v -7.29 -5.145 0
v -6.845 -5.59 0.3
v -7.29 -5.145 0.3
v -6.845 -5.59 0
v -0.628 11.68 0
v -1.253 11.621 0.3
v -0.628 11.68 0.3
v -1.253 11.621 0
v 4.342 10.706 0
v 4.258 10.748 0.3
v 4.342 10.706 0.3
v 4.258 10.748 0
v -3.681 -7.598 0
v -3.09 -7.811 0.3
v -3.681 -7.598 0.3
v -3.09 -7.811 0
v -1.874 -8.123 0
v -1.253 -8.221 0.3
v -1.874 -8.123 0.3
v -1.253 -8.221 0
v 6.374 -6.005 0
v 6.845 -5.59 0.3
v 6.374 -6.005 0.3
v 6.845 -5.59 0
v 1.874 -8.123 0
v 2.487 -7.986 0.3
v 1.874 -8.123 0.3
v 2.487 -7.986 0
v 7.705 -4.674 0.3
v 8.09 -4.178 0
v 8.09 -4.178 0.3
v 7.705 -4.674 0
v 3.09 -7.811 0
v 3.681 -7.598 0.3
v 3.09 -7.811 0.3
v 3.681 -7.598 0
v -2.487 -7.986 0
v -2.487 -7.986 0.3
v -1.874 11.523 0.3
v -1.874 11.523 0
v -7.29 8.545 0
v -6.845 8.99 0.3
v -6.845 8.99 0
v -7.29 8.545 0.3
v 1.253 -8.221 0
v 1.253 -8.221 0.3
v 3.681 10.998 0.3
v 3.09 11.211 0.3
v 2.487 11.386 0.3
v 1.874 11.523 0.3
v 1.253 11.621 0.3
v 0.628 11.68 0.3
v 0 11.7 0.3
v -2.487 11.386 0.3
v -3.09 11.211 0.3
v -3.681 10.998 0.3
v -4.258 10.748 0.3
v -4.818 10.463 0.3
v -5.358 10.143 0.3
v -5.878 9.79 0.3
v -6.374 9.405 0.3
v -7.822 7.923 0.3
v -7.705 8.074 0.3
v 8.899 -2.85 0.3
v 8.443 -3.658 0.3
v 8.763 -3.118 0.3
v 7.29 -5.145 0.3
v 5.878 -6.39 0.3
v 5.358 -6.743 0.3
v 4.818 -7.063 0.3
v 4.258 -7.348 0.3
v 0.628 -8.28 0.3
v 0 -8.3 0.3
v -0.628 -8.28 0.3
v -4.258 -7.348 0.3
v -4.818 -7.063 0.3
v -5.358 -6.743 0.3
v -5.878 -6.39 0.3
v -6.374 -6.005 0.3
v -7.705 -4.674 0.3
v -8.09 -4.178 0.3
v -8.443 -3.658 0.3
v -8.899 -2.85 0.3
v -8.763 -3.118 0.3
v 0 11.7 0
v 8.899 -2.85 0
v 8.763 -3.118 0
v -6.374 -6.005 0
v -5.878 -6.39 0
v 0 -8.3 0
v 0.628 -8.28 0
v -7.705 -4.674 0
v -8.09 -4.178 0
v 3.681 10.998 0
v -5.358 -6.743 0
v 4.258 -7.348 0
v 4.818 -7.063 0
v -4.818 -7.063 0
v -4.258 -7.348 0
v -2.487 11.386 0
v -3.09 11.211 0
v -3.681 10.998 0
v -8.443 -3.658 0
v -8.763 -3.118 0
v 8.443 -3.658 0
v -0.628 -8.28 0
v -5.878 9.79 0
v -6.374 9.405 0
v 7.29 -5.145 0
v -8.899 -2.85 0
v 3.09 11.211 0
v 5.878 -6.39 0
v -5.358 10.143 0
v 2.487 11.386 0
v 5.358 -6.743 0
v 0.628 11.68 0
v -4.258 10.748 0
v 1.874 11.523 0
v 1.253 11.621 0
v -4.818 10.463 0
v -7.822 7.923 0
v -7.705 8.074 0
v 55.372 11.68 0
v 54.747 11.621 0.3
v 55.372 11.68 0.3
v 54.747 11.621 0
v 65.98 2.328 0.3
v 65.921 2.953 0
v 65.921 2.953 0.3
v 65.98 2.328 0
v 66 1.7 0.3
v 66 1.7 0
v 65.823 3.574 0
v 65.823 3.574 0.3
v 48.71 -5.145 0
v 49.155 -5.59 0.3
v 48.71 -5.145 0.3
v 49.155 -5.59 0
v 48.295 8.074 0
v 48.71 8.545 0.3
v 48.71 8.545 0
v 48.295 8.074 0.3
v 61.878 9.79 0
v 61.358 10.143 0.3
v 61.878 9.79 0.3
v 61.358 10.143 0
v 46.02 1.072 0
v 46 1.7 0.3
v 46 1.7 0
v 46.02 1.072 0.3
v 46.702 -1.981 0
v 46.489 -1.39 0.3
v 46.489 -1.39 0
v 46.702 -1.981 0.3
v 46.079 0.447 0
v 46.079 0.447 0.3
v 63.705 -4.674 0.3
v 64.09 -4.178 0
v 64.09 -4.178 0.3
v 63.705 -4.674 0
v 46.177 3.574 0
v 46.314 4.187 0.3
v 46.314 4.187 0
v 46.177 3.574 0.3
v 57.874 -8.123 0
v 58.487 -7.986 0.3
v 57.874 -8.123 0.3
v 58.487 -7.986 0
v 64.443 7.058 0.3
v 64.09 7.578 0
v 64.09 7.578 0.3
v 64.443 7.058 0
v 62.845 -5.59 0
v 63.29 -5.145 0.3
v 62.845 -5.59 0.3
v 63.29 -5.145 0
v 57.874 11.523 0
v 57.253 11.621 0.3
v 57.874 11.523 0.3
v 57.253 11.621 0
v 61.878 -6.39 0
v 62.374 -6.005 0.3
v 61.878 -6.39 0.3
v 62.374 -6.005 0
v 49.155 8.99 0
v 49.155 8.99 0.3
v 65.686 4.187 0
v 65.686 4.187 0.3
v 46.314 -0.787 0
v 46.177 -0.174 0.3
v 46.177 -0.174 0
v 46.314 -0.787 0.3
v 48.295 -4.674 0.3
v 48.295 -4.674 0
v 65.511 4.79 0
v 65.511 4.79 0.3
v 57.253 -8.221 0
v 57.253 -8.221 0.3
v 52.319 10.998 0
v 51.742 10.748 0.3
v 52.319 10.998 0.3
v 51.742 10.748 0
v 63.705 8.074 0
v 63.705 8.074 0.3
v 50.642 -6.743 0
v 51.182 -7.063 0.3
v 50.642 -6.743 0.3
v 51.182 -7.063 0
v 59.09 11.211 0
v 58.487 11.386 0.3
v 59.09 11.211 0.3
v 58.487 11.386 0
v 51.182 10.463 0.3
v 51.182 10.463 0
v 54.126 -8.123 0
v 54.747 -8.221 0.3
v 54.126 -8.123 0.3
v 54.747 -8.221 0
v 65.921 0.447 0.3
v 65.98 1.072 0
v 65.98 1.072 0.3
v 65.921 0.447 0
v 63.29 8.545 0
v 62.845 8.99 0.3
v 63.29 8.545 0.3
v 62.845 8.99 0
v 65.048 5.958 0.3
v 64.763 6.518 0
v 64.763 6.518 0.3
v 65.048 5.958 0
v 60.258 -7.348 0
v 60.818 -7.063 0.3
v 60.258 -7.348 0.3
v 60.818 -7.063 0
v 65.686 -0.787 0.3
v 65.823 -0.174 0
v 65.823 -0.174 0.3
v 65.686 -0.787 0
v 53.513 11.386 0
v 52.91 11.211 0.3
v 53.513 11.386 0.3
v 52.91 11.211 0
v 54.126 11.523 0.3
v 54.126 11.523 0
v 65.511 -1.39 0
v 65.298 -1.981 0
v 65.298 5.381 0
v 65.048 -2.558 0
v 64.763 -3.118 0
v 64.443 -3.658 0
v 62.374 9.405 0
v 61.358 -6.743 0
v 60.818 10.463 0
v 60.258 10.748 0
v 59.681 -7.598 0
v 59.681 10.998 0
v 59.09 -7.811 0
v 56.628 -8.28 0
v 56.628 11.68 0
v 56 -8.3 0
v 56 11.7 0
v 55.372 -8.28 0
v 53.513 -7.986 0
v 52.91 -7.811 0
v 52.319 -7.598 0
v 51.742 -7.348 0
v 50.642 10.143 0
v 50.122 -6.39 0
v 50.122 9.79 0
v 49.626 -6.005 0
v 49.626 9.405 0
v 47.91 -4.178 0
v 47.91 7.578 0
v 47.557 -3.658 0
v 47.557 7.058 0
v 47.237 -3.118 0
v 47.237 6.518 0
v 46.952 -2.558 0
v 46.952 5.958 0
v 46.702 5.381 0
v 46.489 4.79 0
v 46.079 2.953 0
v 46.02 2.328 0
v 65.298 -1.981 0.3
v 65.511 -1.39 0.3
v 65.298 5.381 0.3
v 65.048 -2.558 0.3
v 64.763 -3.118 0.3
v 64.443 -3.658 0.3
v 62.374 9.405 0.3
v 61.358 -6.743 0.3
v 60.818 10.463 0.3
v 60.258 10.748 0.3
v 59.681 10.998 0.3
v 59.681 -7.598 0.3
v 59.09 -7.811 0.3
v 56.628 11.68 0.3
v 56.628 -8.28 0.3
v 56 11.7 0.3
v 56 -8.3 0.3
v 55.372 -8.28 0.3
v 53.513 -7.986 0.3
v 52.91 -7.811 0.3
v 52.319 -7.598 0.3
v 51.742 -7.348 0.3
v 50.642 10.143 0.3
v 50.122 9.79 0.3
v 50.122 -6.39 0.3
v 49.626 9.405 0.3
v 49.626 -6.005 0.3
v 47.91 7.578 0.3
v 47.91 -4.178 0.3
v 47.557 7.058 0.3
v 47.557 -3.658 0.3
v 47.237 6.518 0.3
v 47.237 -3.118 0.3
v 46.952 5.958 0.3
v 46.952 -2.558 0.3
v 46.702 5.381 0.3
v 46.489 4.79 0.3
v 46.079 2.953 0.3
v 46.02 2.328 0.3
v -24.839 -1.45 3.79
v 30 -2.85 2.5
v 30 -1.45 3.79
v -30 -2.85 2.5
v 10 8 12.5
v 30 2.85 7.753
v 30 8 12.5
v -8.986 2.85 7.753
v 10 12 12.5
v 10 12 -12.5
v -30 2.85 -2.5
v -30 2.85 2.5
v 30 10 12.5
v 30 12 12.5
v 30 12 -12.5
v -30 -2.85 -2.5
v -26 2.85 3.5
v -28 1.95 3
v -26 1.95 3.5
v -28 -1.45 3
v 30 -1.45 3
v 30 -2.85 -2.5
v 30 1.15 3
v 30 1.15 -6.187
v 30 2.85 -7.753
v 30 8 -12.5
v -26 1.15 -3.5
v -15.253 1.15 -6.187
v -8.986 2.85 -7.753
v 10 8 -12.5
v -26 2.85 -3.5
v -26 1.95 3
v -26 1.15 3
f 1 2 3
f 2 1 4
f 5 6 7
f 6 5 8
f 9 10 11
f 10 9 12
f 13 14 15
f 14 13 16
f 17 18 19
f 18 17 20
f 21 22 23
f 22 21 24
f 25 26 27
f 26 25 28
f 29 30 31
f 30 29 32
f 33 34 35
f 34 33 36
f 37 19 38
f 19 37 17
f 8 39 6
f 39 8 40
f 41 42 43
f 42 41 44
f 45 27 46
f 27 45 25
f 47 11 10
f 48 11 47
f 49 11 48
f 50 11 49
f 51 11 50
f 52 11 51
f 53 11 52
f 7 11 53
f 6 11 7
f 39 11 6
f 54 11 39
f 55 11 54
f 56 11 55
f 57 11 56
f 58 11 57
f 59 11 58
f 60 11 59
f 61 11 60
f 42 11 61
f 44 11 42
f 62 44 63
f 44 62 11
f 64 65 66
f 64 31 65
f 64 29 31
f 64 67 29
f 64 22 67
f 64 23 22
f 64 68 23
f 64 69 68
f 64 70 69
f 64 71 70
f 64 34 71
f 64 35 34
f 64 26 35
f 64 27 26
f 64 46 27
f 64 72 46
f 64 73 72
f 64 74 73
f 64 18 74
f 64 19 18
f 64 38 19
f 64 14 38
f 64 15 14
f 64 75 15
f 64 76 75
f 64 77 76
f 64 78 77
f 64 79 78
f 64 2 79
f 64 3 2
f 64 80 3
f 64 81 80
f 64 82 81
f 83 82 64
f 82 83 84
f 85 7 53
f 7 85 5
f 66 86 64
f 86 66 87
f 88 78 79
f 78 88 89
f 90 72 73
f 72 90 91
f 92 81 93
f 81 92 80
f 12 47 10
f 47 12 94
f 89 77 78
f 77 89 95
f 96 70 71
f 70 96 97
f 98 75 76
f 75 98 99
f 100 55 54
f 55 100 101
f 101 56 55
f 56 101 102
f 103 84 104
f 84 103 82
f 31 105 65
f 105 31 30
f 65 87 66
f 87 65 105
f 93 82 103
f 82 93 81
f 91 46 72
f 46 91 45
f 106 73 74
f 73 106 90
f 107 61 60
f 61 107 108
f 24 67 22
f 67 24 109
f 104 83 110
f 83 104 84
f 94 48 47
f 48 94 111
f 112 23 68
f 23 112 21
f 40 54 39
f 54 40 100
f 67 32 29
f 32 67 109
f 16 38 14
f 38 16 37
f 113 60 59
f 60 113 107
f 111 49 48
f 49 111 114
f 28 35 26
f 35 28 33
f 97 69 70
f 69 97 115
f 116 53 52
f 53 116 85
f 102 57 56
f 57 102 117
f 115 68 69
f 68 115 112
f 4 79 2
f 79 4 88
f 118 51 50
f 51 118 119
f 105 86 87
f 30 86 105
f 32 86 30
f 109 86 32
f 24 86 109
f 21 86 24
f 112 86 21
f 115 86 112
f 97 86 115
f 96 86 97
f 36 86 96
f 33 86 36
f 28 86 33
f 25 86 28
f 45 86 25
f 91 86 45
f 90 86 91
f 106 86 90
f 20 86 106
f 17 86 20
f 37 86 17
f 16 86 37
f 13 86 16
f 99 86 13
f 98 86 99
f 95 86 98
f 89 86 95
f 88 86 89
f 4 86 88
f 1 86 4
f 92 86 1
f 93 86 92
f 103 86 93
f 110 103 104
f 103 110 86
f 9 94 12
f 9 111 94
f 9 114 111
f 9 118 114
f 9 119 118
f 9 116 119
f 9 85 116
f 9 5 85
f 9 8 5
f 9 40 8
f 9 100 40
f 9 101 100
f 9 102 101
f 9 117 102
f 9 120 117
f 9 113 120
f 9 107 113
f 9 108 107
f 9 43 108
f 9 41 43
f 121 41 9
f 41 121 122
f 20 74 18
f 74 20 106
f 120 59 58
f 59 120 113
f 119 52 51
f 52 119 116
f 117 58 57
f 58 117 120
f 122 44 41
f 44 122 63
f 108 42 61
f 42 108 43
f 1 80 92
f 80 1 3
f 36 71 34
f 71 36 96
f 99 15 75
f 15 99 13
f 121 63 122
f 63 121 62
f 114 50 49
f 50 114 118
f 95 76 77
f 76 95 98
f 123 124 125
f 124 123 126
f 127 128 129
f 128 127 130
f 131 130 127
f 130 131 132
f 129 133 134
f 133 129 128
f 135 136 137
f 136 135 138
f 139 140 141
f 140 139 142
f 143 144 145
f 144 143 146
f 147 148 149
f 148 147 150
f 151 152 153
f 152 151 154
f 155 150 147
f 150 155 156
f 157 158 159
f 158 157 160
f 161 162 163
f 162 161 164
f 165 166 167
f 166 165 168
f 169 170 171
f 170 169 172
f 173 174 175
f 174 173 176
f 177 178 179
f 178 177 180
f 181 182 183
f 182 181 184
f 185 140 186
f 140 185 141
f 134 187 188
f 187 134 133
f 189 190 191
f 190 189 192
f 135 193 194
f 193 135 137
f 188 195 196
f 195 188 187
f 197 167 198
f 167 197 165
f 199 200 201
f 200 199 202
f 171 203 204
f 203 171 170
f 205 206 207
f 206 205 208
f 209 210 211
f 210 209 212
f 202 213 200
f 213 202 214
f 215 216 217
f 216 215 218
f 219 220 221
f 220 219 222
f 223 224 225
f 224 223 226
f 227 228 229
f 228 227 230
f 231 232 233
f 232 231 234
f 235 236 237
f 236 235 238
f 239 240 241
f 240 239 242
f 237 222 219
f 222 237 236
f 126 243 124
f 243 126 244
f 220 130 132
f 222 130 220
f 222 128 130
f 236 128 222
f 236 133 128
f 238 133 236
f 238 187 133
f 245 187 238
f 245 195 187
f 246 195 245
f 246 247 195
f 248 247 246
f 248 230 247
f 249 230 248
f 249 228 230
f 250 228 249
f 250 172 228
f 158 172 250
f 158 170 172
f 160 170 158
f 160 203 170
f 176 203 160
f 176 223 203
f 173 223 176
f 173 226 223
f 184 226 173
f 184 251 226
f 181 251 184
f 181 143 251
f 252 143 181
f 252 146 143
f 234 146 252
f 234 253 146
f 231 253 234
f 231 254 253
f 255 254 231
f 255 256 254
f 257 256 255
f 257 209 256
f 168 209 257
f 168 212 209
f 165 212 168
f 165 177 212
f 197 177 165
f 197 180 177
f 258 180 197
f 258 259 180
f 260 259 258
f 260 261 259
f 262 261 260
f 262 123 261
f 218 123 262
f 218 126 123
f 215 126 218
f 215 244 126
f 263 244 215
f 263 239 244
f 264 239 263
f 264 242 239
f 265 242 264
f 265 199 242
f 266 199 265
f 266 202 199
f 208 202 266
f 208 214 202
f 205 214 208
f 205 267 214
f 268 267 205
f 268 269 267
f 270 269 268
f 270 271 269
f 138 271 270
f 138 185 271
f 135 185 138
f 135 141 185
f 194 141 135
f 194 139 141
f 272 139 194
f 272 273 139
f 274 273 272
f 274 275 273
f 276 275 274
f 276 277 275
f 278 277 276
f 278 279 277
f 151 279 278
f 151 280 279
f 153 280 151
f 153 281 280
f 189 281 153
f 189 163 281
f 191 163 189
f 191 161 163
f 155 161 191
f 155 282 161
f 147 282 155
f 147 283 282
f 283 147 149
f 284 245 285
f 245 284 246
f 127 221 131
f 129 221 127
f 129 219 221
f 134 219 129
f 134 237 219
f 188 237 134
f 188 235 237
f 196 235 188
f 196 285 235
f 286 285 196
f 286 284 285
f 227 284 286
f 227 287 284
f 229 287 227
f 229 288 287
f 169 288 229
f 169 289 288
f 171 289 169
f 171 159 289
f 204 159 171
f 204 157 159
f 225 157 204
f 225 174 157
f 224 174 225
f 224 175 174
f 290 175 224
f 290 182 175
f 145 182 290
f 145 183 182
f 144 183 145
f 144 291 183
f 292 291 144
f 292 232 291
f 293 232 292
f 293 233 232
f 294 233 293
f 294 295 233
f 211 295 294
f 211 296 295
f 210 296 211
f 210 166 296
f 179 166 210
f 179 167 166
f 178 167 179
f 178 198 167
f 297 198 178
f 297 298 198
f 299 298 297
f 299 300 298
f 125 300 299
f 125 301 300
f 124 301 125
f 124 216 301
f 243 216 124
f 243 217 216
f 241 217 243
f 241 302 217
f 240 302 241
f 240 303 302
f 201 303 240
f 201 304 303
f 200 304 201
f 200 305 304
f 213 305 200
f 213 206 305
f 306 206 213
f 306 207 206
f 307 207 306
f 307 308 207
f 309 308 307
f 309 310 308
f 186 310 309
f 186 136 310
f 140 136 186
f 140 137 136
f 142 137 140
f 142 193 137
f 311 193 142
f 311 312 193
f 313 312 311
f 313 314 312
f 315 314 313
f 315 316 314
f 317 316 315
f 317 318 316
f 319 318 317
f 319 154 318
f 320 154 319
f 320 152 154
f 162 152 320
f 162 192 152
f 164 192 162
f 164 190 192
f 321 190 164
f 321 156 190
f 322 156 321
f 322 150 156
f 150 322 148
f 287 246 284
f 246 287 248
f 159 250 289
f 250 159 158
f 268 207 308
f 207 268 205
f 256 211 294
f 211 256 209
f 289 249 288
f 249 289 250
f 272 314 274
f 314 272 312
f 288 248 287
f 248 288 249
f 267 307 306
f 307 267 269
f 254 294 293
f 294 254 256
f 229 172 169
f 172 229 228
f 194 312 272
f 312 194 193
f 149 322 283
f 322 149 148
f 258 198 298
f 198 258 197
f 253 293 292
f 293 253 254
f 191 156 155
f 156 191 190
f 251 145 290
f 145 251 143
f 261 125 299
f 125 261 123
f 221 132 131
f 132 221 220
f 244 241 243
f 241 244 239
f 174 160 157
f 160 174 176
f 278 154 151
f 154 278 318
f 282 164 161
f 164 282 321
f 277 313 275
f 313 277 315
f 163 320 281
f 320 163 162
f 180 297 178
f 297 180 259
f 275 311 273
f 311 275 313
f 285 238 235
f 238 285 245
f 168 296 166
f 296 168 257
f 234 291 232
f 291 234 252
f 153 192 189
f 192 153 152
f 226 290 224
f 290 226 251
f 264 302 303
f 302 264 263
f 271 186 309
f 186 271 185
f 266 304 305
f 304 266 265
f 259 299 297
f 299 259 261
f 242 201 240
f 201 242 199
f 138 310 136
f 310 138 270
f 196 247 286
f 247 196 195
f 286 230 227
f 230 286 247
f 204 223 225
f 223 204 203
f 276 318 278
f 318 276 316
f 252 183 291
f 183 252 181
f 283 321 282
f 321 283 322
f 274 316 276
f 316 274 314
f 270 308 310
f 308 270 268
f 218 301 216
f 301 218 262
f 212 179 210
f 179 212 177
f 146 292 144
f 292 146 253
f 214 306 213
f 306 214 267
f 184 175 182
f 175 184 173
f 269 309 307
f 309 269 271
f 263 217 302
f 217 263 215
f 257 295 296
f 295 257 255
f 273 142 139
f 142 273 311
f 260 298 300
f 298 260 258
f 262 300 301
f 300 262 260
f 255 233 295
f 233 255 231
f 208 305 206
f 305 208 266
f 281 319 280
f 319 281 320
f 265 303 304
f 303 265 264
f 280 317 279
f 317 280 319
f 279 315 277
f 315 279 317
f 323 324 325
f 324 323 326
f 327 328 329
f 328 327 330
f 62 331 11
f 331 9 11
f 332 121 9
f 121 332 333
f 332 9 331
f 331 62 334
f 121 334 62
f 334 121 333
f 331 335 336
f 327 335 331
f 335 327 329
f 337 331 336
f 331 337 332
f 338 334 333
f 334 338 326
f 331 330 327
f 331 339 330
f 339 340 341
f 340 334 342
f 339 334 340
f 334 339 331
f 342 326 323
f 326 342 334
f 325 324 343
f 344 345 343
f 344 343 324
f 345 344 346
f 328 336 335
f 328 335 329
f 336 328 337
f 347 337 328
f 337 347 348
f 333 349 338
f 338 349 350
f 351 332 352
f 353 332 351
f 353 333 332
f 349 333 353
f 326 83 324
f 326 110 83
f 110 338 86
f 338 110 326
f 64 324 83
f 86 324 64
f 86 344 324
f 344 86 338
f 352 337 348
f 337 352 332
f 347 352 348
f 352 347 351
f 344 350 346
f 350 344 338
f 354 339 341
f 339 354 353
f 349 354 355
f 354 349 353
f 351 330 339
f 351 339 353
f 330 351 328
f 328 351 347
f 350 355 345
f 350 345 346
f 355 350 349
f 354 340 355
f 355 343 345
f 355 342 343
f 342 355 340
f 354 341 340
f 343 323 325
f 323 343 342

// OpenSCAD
// file: inc/screwsizes.scad
/////////////////////////////////////////////////////////////////////////////////
// screwsizes.scad - has the screw sizes I use
/////////////////////////////////////////////////////////////////////////////////
// created 7/13/2016
// last update 7/20/16
/////////////////////////////////////////////////////////////////////////////////
screw2 = 2.6;
screw3 = 3.5;
screw3t = 2.6;
screw3hd = 6.5;
screw4 = 4.5;
screw4t = 3.5;
screw4hd = 7.5;
nut4 = 8.1;
screw5 = 5.7;
screw5t = 4.5;
screw5hd = 11;
screw8 = 8.7;
nut5 = 9.5;
//////////////////////////////////////////////////////////////////////////////////
// file: BOSL2/std.scad
// Minimal BOSL2 compatibility shim for bundled gallery models.
// It implements only the helpers used by the imported OpenSCAD projects.

CENTER = [0, 0, 0];
BOTTOM = [0, 0, -1];
TOP = [0, 0, 1];
LEFT = [-1, 0, 0];
RIGHT = [1, 0, 0];
FRONT = [0, -1, 0];
BACK = [0, 1, 0];

module up(z=0) {
    translate([0, 0, z]) children();
}

module down(z=0) {
    translate([0, 0, -z]) children();
}

module attach(anchor=CENTER) {
    children();
}

module cuboid(size=[1, 1, 1], anchor=CENTER) {
    center = anchor == CENTER;
    translate(center ? [0, 0, 0] : [0, 0, size[2] / 2])
        cube(size, center=true);
    children();
}

module xcyl(h=1, r=1, anchor=CENTER) {
    center = anchor == CENTER;
    translate(center ? [0, 0, 0] : [h / 2, 0, 0])
        rotate([0, 90, 0])
            cylinder(h=h, r=r, center=true);
}
// main file
// HolderForPuttyKnife.scad
// Created 9/23/20
// Last Update: 9/24/20
//////////////////////////////////////////////////////////////////////////////////////////////////////////////////////
// 9/23/20	- Added tabs
// 4/13/21	- Converted to BOSL2 and made it more round
//////////////////////////////////////////////////////////////////////////////////////////////////////////////////////
include <BOSL2/std.scad>
include <inc/screwsizes.scad>
/////////////////////////////////////////////////////////////////////////////////////////////////////////////////////
$fn=100;
BladeWidth=56;
BladeThickness=1.7;
LayerThickness=0.3;
////////////////////////////////////////////////////////////////////////////////////////////////////////////////////

PuttyKnifeHolder(1);

/////////////////////////////////////////////////////////////////////////////////////////////////////////////////////\

module PuttyKnifeHolder(DoTab=0) {
	difference() {
		union() {
			color("khaki") hull() {
				color("cyan") cuboid([BladeWidth+4,BladeThickness+4,5],rounding=2,p1=[0,0]);
				translate([BladeWidth/2-8,10,0]) color("green") cuboid([20,4,25],rounding=2,p1=[0,0]);
			}
			if(DoTab) {
				translate([0,BladeThickness,0]) tab();
				translate([BladeWidth,BladeThickness,0]) tab();
			}
		}
		translate([2,2,-1]) color("red") cuboid([BladeWidth,BladeThickness,40],rounding=0.5,p1=[0,0]);
		translate([BladeWidth/2+2,17,18]) color("red") rotate([90,0,0]) cylinder(h=20,d=screw5);
		translate([BladeWidth/2+2,10,18]) color("blue") rotate([90,0,0]) cylinder(h=10,d=screw5hd);
		translate([0,0.25,5.5]) color("cyan") cuboid([BladeWidth+4,BladeThickness*2,5],rounding=0.5,p1=[0,0]);
	}
}

//////////////////////////////////////////////////////////////////////////////////////////////////////////////////////

module tab() { // help print stick
	color("gray") cylinder(h=LayerThickness,d=20);
}

////////////////////////////////////////////////////////////////////////////////////////////////////////////////////////////
